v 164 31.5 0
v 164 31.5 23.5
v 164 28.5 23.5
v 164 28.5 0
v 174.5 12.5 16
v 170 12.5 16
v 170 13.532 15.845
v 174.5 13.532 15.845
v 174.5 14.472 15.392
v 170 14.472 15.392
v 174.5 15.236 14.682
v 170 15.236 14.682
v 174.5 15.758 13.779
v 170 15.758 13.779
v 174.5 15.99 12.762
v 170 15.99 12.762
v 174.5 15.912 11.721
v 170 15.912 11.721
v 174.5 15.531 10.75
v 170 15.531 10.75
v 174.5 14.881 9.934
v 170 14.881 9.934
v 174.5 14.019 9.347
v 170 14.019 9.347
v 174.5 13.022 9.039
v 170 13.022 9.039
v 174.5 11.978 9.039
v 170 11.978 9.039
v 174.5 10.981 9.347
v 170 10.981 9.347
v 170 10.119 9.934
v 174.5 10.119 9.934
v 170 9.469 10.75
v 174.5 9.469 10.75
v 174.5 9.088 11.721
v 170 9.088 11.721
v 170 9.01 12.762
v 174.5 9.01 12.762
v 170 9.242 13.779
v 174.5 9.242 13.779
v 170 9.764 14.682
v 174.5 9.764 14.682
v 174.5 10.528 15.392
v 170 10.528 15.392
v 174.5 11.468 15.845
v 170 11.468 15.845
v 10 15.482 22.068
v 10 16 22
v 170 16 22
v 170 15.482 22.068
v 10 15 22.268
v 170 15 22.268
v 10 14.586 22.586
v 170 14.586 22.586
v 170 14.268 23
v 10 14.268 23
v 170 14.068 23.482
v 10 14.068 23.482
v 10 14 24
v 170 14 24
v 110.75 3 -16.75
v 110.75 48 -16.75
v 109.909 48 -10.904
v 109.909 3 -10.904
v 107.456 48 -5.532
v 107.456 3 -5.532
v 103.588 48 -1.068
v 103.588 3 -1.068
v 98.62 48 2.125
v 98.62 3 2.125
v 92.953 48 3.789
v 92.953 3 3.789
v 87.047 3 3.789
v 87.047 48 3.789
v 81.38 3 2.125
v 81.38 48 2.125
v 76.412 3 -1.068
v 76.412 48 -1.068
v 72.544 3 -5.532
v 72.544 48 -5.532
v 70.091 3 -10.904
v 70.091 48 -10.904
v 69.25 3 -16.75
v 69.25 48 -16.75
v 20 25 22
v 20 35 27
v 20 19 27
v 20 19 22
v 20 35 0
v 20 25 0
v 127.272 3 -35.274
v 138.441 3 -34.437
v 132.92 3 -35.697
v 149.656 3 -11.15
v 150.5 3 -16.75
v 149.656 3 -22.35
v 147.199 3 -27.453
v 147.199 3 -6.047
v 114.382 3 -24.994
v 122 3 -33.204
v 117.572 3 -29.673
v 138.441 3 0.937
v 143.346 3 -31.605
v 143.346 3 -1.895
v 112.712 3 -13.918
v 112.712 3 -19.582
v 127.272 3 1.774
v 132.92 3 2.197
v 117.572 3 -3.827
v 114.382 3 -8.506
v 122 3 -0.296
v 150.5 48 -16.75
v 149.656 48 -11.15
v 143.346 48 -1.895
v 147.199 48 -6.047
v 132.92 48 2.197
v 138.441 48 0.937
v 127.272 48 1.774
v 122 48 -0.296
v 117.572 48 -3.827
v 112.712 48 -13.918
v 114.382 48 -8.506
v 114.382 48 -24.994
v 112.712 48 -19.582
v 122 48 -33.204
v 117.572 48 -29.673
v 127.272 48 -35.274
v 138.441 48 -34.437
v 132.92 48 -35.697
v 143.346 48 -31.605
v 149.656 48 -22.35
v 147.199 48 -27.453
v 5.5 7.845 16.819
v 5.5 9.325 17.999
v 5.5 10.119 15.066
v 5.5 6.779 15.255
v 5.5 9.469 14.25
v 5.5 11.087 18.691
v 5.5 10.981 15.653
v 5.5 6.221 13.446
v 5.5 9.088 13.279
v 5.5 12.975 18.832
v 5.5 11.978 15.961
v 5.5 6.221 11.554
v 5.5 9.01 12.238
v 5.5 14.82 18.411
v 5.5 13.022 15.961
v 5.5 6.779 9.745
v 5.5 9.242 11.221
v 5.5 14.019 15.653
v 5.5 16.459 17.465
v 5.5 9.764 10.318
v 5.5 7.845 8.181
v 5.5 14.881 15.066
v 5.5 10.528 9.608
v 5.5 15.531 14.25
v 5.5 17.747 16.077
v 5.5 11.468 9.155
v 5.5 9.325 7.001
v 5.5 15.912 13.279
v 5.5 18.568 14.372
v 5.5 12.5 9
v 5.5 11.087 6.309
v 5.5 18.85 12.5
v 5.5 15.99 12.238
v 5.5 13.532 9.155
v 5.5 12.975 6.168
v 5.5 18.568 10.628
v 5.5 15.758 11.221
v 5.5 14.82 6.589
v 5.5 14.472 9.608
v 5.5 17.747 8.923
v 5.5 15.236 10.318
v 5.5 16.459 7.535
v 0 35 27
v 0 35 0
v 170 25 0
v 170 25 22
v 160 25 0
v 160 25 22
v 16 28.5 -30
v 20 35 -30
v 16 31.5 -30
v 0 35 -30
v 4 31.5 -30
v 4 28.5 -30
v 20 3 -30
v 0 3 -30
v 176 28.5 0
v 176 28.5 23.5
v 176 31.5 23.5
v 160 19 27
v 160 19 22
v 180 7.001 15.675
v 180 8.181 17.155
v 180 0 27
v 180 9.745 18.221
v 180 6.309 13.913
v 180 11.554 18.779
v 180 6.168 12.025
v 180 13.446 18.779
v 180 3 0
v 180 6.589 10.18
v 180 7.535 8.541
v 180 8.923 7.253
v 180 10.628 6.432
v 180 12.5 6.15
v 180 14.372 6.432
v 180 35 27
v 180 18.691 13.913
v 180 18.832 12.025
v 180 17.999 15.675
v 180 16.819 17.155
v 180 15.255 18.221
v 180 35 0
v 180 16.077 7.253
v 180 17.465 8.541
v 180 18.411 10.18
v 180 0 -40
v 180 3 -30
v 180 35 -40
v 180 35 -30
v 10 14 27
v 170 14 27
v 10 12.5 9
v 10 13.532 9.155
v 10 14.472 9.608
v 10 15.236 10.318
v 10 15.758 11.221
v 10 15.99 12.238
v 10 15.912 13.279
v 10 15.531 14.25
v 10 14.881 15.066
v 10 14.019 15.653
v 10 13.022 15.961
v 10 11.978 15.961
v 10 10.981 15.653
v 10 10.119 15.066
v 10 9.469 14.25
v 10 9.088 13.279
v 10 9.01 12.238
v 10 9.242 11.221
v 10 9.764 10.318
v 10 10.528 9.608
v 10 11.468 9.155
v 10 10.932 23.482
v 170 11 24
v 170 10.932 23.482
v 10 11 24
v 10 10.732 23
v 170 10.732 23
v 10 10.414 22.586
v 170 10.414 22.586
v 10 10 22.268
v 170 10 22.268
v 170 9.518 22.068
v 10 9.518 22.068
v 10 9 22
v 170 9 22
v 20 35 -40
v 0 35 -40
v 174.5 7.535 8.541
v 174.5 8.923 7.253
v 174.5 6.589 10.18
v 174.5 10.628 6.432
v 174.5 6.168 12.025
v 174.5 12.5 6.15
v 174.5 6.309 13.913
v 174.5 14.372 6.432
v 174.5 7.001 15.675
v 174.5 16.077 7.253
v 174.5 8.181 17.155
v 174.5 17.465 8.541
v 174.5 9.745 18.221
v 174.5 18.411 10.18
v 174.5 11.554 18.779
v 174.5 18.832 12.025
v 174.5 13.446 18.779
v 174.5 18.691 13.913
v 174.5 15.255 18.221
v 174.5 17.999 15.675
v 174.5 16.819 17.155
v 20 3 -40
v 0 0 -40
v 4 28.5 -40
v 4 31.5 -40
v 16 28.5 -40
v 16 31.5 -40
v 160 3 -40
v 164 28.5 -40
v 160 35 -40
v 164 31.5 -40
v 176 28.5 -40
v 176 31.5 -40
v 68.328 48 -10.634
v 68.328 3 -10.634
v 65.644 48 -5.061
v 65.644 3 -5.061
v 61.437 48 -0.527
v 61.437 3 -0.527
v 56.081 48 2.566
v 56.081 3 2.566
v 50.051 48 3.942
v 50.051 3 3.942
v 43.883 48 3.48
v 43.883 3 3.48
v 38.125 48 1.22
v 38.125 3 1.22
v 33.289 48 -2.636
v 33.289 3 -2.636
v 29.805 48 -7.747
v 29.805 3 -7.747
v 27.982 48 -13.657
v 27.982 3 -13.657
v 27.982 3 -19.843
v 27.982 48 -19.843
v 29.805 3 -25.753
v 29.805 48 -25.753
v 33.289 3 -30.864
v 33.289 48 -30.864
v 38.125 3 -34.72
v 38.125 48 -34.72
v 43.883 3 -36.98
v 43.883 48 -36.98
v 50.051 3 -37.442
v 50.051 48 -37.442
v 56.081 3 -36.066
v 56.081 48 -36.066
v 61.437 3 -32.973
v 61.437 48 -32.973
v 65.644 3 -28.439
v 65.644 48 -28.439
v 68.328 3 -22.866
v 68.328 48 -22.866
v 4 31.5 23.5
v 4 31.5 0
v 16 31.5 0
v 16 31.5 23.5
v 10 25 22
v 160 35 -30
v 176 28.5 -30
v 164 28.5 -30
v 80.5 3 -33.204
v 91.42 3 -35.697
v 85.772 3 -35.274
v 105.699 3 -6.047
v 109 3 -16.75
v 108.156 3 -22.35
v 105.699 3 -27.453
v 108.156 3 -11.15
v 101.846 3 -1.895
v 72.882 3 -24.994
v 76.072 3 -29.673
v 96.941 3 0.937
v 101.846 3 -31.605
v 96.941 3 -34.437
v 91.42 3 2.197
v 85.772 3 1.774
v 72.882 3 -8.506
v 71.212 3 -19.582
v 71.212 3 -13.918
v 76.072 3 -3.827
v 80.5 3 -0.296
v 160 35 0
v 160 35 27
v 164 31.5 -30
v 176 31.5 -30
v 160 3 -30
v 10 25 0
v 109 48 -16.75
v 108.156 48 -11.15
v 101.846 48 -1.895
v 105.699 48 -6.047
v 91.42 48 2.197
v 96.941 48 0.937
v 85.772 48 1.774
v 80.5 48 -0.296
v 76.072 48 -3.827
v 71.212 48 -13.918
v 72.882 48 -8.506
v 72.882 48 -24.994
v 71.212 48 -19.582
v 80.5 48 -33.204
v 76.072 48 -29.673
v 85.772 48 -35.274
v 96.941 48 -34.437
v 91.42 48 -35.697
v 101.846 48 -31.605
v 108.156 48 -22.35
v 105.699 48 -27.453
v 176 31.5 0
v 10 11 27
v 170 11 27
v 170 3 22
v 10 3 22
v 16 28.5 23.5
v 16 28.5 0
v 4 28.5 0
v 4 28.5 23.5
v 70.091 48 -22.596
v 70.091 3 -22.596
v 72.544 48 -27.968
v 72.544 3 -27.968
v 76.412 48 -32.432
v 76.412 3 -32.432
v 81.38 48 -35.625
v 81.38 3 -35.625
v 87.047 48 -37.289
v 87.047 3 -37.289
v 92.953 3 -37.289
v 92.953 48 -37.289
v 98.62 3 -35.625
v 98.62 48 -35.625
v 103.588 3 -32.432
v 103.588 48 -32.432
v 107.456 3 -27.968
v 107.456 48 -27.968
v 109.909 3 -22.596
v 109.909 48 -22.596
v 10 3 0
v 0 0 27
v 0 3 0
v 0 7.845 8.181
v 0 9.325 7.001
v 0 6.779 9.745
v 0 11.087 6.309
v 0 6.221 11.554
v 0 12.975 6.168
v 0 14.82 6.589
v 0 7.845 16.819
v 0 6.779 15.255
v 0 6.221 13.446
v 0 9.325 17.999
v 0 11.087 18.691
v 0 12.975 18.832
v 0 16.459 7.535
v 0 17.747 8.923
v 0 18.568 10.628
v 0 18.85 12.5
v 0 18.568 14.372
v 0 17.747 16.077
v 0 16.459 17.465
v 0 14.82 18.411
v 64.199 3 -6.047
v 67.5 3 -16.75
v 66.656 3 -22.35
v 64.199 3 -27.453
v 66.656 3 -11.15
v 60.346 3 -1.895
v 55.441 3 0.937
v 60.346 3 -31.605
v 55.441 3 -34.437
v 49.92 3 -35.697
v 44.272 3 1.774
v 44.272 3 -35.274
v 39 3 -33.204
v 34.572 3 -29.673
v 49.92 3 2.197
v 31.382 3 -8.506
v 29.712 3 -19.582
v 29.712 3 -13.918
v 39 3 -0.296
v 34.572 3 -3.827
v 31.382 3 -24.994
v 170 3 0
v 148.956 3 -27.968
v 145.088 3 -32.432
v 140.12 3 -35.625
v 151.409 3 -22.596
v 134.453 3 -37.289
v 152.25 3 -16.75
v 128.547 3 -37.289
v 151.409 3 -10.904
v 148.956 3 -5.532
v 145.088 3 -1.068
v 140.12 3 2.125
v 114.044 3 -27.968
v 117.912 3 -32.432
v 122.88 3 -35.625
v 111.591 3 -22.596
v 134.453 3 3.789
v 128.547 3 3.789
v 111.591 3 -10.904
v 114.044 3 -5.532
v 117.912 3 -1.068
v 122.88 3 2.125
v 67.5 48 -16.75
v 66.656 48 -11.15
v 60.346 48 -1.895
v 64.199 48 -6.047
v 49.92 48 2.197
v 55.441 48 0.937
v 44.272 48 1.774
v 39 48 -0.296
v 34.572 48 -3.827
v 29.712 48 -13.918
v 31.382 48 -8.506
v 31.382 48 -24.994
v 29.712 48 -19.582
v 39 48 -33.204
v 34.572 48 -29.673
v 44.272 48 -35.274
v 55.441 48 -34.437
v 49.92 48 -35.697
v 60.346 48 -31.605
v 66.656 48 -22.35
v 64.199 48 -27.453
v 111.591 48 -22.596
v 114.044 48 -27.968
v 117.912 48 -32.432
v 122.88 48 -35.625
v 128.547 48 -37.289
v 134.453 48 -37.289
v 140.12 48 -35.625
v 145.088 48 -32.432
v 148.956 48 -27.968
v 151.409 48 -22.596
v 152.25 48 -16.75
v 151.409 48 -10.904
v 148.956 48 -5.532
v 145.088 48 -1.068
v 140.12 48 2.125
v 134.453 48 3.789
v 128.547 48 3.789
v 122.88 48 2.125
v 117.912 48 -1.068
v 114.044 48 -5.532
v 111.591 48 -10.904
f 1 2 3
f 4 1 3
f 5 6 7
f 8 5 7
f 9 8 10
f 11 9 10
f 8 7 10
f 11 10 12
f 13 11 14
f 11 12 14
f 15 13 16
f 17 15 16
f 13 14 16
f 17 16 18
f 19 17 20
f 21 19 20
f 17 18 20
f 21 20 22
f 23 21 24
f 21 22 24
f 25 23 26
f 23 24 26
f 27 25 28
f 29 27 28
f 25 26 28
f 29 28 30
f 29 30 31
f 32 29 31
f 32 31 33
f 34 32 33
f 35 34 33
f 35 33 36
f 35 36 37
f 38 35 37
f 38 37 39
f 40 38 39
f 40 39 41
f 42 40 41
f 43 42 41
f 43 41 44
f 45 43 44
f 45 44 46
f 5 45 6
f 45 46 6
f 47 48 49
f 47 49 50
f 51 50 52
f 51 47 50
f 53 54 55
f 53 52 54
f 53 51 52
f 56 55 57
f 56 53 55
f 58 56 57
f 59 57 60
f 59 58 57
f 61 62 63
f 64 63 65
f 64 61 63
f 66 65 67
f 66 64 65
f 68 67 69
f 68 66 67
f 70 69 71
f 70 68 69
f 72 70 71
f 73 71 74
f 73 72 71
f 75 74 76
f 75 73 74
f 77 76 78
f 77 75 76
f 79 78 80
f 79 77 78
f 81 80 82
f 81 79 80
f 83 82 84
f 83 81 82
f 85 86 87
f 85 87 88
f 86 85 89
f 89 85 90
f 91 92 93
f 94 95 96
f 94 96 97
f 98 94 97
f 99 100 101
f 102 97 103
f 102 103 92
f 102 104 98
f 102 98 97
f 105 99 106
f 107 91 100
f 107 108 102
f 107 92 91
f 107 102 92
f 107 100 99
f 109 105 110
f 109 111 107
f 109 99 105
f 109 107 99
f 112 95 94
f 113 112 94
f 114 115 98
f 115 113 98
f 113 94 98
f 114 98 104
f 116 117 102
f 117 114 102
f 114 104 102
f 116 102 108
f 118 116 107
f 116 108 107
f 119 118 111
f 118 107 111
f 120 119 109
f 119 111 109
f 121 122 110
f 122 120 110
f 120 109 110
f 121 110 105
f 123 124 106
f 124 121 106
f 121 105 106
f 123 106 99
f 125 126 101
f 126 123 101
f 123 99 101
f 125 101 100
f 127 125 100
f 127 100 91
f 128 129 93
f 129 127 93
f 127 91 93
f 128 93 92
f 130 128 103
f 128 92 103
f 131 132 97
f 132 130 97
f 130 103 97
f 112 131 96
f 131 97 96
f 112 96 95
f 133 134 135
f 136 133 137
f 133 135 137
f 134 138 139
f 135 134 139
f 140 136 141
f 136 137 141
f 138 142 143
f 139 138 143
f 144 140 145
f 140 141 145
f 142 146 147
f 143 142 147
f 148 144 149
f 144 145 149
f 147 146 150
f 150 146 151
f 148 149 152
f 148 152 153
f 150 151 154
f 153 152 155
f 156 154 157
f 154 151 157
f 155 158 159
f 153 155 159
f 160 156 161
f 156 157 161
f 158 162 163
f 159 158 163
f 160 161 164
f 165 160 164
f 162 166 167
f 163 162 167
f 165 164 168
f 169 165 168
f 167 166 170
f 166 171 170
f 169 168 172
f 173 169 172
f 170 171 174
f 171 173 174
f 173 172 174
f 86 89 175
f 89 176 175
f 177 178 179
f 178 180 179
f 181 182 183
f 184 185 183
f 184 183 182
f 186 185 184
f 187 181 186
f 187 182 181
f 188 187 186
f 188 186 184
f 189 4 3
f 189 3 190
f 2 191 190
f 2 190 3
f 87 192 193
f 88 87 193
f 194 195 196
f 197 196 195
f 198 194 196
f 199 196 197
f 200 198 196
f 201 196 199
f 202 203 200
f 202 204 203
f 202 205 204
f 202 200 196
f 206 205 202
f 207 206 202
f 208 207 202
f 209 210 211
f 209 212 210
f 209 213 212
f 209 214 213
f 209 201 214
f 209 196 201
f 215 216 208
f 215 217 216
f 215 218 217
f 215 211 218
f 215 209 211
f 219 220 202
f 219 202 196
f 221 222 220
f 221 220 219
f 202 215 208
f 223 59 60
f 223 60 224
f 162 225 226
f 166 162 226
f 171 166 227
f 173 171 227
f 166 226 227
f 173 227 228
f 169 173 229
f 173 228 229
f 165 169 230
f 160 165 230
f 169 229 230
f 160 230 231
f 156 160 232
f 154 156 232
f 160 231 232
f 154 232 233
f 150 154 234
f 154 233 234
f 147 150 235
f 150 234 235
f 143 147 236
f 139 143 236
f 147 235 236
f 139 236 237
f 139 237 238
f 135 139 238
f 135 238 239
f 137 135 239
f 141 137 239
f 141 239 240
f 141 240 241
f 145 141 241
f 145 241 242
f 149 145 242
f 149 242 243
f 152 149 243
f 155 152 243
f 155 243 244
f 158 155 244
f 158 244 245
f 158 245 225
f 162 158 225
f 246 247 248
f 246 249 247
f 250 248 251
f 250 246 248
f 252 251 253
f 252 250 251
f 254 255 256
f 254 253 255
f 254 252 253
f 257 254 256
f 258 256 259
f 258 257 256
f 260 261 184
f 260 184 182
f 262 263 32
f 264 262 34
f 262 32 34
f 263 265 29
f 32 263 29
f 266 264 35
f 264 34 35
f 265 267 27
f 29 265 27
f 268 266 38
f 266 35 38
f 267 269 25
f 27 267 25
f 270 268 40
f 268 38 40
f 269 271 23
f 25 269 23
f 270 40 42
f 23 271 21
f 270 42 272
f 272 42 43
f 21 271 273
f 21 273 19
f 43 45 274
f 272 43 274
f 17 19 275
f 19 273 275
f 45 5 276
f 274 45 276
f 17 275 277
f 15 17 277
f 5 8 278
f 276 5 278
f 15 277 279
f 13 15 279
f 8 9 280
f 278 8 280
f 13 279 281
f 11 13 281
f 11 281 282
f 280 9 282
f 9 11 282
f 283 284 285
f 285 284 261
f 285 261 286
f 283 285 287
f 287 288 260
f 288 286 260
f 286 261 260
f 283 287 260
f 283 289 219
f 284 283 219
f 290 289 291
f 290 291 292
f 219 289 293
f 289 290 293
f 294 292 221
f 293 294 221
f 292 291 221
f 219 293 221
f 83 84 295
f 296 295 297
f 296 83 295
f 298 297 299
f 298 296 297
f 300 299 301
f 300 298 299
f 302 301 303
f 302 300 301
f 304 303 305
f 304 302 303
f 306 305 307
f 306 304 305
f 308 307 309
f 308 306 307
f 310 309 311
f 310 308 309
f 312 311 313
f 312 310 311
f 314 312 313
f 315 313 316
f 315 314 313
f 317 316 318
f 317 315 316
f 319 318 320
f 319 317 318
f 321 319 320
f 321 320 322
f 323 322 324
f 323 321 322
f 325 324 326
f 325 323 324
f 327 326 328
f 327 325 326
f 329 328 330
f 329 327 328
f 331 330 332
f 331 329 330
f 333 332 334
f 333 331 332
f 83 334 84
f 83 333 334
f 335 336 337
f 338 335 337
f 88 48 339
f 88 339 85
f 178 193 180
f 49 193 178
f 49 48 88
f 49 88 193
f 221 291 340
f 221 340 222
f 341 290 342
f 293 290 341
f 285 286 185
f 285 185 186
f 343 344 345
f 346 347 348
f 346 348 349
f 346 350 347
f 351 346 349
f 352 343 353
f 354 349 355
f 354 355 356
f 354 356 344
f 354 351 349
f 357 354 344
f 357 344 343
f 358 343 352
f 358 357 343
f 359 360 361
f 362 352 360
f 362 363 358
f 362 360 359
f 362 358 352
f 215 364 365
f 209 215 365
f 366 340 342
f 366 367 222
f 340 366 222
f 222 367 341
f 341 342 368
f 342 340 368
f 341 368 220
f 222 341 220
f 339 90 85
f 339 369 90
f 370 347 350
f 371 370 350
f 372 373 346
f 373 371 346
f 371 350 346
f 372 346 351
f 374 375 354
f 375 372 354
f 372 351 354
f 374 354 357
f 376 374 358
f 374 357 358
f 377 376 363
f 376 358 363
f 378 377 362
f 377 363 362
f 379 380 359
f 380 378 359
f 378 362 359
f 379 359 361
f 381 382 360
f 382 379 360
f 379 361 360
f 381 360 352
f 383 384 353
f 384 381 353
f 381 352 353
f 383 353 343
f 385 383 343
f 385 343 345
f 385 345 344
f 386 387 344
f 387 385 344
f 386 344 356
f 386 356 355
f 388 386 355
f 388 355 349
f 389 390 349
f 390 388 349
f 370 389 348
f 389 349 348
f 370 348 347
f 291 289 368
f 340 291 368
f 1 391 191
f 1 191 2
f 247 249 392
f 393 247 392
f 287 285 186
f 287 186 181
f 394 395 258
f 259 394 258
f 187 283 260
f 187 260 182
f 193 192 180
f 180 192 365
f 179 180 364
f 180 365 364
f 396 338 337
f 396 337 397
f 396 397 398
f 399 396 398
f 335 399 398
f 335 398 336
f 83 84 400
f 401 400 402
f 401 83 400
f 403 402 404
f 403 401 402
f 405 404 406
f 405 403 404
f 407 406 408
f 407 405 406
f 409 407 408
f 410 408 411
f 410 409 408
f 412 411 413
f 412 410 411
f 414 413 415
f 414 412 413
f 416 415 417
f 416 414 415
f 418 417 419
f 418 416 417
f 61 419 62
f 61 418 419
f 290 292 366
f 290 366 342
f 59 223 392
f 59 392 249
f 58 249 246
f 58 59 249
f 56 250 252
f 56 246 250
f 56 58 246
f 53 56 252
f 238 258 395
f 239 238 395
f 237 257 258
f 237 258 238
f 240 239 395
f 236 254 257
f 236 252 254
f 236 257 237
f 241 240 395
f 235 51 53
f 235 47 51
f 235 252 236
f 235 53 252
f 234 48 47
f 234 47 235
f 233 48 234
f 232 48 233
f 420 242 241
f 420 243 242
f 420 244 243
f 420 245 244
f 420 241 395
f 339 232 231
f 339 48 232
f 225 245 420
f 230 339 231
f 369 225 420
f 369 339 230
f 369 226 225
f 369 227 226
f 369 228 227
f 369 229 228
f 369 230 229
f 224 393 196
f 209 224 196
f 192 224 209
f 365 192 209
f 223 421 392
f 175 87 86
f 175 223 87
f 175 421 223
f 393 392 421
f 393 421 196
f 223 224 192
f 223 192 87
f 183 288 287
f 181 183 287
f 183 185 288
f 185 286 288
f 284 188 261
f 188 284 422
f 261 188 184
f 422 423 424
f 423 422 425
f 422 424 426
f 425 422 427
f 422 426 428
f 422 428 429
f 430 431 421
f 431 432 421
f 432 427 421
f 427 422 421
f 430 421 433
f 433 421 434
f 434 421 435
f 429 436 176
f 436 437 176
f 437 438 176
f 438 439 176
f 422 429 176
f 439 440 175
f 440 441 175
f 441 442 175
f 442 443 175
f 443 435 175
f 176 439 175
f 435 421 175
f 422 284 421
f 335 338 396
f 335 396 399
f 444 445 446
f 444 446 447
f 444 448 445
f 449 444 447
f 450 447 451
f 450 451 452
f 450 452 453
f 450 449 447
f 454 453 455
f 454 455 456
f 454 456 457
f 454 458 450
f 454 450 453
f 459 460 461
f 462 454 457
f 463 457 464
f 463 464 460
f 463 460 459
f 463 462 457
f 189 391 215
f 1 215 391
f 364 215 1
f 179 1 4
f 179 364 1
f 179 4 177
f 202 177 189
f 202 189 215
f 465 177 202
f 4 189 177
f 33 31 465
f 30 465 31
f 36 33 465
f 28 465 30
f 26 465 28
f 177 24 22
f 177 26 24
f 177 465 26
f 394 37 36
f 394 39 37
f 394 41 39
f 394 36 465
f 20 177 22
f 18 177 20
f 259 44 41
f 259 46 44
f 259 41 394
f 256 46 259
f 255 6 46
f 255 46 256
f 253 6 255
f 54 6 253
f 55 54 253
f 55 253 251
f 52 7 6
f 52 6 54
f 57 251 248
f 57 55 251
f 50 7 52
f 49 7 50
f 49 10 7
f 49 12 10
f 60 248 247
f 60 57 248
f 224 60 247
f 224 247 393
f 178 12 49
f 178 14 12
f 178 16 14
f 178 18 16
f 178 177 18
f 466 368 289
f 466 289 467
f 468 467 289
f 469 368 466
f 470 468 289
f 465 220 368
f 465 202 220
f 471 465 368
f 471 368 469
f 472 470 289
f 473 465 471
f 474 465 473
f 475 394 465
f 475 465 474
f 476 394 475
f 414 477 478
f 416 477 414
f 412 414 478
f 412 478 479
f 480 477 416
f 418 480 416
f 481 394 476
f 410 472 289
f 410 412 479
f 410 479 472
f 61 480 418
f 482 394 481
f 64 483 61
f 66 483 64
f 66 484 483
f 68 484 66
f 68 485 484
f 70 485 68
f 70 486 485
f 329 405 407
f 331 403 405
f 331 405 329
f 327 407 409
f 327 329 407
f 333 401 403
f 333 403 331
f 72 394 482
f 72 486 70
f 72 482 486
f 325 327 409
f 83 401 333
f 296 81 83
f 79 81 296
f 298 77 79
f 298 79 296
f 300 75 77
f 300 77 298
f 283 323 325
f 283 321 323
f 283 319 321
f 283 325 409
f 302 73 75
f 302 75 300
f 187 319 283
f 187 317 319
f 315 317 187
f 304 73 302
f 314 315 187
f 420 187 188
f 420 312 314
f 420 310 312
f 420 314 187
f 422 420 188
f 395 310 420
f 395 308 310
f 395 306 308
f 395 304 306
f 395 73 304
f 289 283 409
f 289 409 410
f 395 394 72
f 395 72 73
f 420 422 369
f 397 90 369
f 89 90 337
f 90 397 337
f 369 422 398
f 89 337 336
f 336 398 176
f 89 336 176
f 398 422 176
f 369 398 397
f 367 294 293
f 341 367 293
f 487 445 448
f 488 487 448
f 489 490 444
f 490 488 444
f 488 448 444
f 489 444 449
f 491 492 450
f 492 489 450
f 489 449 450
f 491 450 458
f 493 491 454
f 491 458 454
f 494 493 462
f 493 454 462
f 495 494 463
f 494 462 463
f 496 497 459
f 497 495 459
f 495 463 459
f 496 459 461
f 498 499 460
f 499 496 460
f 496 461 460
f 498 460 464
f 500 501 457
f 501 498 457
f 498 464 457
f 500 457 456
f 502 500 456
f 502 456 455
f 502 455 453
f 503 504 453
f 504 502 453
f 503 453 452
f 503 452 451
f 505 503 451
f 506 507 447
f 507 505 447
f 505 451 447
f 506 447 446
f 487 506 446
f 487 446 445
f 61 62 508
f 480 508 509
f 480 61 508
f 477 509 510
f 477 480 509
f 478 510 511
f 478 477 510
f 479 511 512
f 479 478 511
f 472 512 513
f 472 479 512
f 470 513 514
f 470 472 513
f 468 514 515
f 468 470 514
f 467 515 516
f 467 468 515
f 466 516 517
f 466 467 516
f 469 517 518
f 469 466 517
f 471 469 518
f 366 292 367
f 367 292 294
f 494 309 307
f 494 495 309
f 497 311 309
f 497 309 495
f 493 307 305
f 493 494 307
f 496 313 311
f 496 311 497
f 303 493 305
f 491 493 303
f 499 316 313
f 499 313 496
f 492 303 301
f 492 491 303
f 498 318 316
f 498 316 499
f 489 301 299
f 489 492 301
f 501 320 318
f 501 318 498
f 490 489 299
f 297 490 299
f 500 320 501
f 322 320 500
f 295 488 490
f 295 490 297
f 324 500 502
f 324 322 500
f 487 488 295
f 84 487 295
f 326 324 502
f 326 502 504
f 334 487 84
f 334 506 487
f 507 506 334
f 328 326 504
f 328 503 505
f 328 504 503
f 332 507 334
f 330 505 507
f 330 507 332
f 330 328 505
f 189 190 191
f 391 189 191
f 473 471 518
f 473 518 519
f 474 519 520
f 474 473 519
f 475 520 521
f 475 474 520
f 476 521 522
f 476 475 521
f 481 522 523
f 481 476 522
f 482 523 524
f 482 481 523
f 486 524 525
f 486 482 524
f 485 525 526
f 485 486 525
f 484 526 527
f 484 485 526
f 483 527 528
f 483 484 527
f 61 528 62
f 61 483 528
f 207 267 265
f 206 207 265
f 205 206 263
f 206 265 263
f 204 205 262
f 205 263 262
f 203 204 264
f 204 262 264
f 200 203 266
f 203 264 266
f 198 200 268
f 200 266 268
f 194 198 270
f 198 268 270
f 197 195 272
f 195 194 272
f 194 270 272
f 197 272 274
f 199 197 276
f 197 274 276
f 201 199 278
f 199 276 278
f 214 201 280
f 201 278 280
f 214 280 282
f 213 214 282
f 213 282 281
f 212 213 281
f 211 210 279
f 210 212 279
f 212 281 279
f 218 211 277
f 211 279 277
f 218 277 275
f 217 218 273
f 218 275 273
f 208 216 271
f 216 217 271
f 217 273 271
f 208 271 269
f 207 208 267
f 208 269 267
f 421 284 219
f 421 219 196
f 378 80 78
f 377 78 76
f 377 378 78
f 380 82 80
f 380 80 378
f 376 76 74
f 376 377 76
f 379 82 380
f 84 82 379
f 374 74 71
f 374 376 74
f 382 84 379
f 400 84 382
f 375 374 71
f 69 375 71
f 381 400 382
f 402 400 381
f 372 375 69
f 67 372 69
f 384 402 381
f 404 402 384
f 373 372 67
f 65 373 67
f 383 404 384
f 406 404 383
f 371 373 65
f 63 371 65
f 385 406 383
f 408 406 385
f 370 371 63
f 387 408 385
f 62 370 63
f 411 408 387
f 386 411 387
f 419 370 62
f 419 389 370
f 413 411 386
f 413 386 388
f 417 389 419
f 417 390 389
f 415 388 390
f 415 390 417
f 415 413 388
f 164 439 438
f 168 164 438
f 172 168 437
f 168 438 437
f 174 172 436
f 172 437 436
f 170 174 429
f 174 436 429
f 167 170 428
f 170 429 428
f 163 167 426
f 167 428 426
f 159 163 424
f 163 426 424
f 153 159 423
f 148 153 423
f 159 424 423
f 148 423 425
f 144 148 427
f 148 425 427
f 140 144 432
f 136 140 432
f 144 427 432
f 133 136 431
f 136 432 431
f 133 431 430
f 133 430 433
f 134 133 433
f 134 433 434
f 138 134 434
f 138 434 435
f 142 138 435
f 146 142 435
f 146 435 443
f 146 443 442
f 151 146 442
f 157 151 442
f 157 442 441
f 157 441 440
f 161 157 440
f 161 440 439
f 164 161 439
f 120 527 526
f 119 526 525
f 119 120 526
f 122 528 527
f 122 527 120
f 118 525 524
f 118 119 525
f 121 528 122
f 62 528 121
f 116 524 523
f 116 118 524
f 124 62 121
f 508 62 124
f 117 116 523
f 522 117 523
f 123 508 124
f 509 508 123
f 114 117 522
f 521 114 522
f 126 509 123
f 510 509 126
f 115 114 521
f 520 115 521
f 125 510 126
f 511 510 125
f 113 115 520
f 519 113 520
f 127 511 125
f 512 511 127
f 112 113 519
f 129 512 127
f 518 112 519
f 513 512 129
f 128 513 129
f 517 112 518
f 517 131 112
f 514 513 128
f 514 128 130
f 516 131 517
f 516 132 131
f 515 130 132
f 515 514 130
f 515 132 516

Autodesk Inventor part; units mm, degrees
ref_plane "YZ Plane" through (0, 0, 0) normal (1, 0, 0) x (0, 1, 0)
ref_plane "XZ Plane" through (0, 0, 0) normal (0, 1, 0) x (-1, 0, 0)
ref_plane "XY Plane" through (0, 0, 0) normal (0, 0, 1) x (1, 0, 0)
sketch "Sketch1" plane through (0, 0, 0) normal (1, 0, 0) x (0, 1, 0)
  line L0 (0, 0) -> (35, 0)
  line L1 (35, 0) -> (35, 27)
  line L2 (35, 27) -> (0, 27)
  line L3 (0, 27) -> (0, 0)
  line L4 (0, 27) -> (25, 27) construction
  line L5 (25, 27) -> (25, 0) construction
  line L6 (25, 0) -> (0, 0) construction
  line L7 (0, 0) -> (0, 27) construction
  circle A0 centre (12.5, 12.5) radius 6.35
  dimension "d0" = 35
  dimension "d1" = 27
  dimension "d2" = 25
  dimension "d3" = 12.7
extrude "Extrusion1" add sketch "Sketch1" along normal blind 10
sketch "Sketch2" plane through (10, 0, 0) normal (1, 0, 0) x (0, 0, -1)
  line L0 (0, 35) -> (-27, 35) projected
  line L1 (0, 0) -> (0, 35) projected
  line L2 (-27, 35) -> (0, 35)
  line L3 (0, 35) -> (0, 25)
  line L4 (0, 25) -> (-27, 25)
  line L5 (-27, 25) -> (-27, 35)
  dimension "d6" = 10
extrude "Extrusion2" add sketch "Sketch2" along normal blind 10
sketch "Sketch3" plane through (10, 0, 0) normal (1, 0, 0) x (0, 0, -1)
  point P0 (0, 0)
sketch "Sketch4" plane through (0, 0, 0) normal (0, 0, -1) x (-1, 0, 0)
  point P0 (0, 0)
sketch "Sketch5" plane through (10, 0, 0) normal (1, 0, 0) x (0, 0, -1)
  point P0 (0, 0)
sketch "Sketch6" plane through (10, 0, 0) normal (1, 0, 0) x (0, 0, -1)
  line L0 (-27, 25) -> (-27, 0) projected
  line L1 (-27, 0) -> (-22, 0)
  line L2 (-22, 0) -> (-22, 11)
  line L3 (-22, 11) -> (-27, 11)
  line L4 (-27, 11) -> (-27, 0)
  line L5 (-22, 14) -> (-27, 14)
  line L6 (-27, 14) -> (-27, 19)
  line L7 (-27, 19) -> (-22, 19)
  line L8 (-22, 19) -> (-22, 14)
  point P0 (0, 0)
  dimension "d9" = 5
  dimension "d10" = 11
  dimension "d11" = 5
extrude "Extrusion3" add sketch "Sketch6" along normal blind 150
sketch "Sketch7" plane through (10, 19, 27) normal (0, 1, 0) x (1, 0, 0)
  line L0 (-10, 0) -> (10, 0) projected
  line L1 (0, 5) -> (150, 5) projected
  line L2 (0, 0) -> (10, 0)
  line L3 (10, 0) -> (10, 5)
  line L4 (10, 5) -> (0, 5)
  line L5 (0, 5) -> (0, 0)
  point P0 (-10, 27)
  dimension "d14" = 10
extrude "Extrusion4" add sketch "Sketch7" along normal blind 7.5
sketch "Sketch8" plane through (160, 0, 0) normal (1, 0, 0) x (0, 0, -1)
  line L0 (-27, 14) -> (-22, 14) projected
  line L1 (-27, 14) -> (-22, 14)
  line L2 (-22, 25) -> (-22, 14) projected
  line L3 (-22, 14) -> (-22, 25)
  line L4 (-22, 25) -> (0, 25) projected
  line L5 (-22, 25) -> (0, 25)
  line L6 (0, 25) -> (0, 35) projected
  line L7 (0, 25) -> (0, 35)
  line L8 (0, 35) -> (-27, 35)
  line L9 (-27, 35) -> (-27, 14)
  line L10 (-22, 11) -> (-22, 0) projected
  line L11 (-27, 0) -> (-22, 0)
  line L12 (-22, 0) -> (-22, 11)
  line L13 (-22, 11) -> (-27, 11)
  line L14 (-27, 11) -> (-27, 0)
  point P0 (0, 0)
extrude "Extrusion5" add sketch "Sketch8" along normal blind 10
sketch "Sketch9" plane through (170, 0, 0) normal (1, 0, 0) x (0, 0, -1)
  line L0 (0, 35) -> (-27, 35) projected
  line L1 (-27, 35) -> (0, 35)
  line L2 (0, 35) -> (0, 0)
  line L3 (0, 0) -> (-27, 0)
  line L4 (-27, 0) -> (-27, 35)
  circle A0 centre (-12.5, 12.5) radius 6.35 projected
  circle A1 centre (-12.5, 12.5) radius 6.35
extrude "Extrusion6" add sketch "Sketch9" along normal blind 10
fillet "Fillet1" radius 2 2 edges at (90, 11, 22) (90, 14, 22)
sketch "Sketch10" plane through (20, 0, 0) normal (1, 0, 0) x (0, 0, -1)
  line L0 (0, 35) -> (-27, 35) projected
  line L1 (-13.5, 35) -> (-20.5, 35)
  line L2 (-20.5, 35) -> (-6.5, 35)
  line L3 (-20.5, 35) -> (-6.5, 35)
  line L4 (-6.5, 35) -> (-6.5, 32)
  line L5 (-6.5, 32) -> (-20.5, 32)
  line L6 (-20.5, 32) -> (-20.5, 35)
  point P0 (0, 0)
  dimension "d22" = 7
  dimension "d23" = 14
  dimension "d24" = 3
extrude "Extrusion7" add sketch "Sketch10" along normal blind 140
sketch "Sketch11" plane through (0, 35, 27) normal (0, 1, 0) x (1, 0, 0)
  point P0 (0, 27)
sketch "Sketch12" plane through (160, 25, 0) normal (0, 0, -1) x (-1, 0, 0)
  line L0 (-4, 3.5) -> (-16, 3.5)
  line L1 (-16, 3.5) -> (-16, 6.5)
  line L2 (-16, 6.5) -> (-4, 6.5)
  line L3 (-4, 6.5) -> (-4, 3.5)
  line L4 (-4, 3.5) -> (-16, 6.5) construction
  line L5 (-16, 3.5) -> (-4, 6.5) construction
  line L6 (156, 6.5) -> (144, 6.5)
  line L7 (144, 6.5) -> (144, 3.5)
  line L8 (144, 3.5) -> (156, 3.5)
  line L9 (156, 3.5) -> (156, 6.5)
  line L10 (156, 6.5) -> (144, 3.5) construction
  line L11 (144, 6.5) -> (156, 3.5) construction
  point P0 (160, -25)
  point P1 (-10, 5)
  point P2 (150, 5)
  dimension "d27" = 12
  dimension "d28" = 3
  dimension "d29" = 12
  dimension "d30" = 3
extrude "Extrusion8" cut sketch "Sketch12" against normal blind 23.5
sketch "Sketch13" plane through (0, 0, 0) normal (-1, 0, 0) x (0, 0, 1)
  circle A0 centre (12.5, 12.5) radius 6.35 construction
  circle A1 centre (12.5, 12.5) radius 20.6375 construction
  point P0 (0, 0)
  dimension "d33" = 41.275
sketch "Sketch14" plane through (170, 0, 0) normal (-1, 0, 0) x (0, 0, 1)
  circle A0 centre (12.5, 12.5) radius 6.35 projected
  circle A1 centre (12.5, 12.5) radius 6.35
  circle A2 centre (12.5, 12.5) radius 3.5
  point P0 (0, 0)
  dimension "d34" = 7
extrude "Extrusion9" add sketch "Sketch14" against normal blind 4.5
sketch "Sketch15" plane through (10, 0, 0) normal (1, 0, 0) x (0, 0, -1)
  circle A0 centre (-12.5, 12.5) radius 3.5 projected
  circle A1 centre (-12.5, 12.5) radius 6.35
  circle A2 centre (-12.5, 12.5) radius 3.5
  point P0 (0, 0)
  dimension "d37" = 7
extrude "Extrusion10" add sketch "Sketch15" against normal blind 4.5
sketch "Sketch16" plane through (0, 0, 27) normal (0, 0, 1) x (1, 0, 0)
  point P0 (0, 0)
sketch "Sketch17" plane through (0, 0, 27) normal (0, 0, 1) x (1, 0, 0)
  point P0 (0, 0)
sketch "Sketch18" plane through (0, 0, 27) normal (0, 0, 1) x (1, 0, 0)
  line L0 (0, 35) -> (0, 0) projected
  line L1 (180, 35) -> (180, 0) projected
  line L2 (0, 0) -> (180, 0)
  line L3 (180, 0) -> (180, 3)
  line L4 (180, 3) -> (0, 3)
  line L5 (0, 3) -> (0, 0)
  point P0 (0, 3)
  dimension "d40" = 3
extrude "Extrusion11" add sketch "Sketch18" against normal blind 67
sketch "Sketch19" plane through (0, 3, 27) normal (0, 1, 0) x (-1, 0, 0)
  line L0 (180, 0) -> (180, -42) construction
  point P0 (0, 0)
sketch "Sketch20" plane through (0, 3, -40) normal (0, 1, 0) x (1, 0, 0)
  circle A0 centre (90, -20) radius 19
  circle A1 centre (90, -20) radius 20
  circle A2 centre (50, -20) radius 20
  circle A3 centre (50, -20) radius 19
  circle A4 centre (130, -20) radius 20
  circle A5 centre (130, -20) radius 19
  point P0 (0, -40)
  point P1 (110, -20)
  point P2 (70, -20)
  dimension "d43" = 38
  dimension "d44" = 38
  dimension "d45" = 38
extrude "Extrusion12" add sketch "Sketch20" along normal blind 30
sketch "Sketch21" plane through (10, 3, 22) normal (0, 1, 0) x (1, 0, 0)
  line L0 (-10, 22) -> (-10, 62) projected
  line L1 (-10, 62) -> (10, 62)
  line L2 (10, 62) -> (10, 52)
  line L3 (10, 52) -> (-10, 52)
  line L4 (-10, 52) -> (-10, 62)
  line L5 (170, 62) -> (-10, 62) projected
  line L6 (170, 62) -> (150, 62)
  line L7 (150, 62) -> (150, 52)
  line L8 (150, 52) -> (170, 52)
  line L9 (170, 52) -> (170, 62)
  dimension "d48" = 10
  dimension "d49" = 10
extrude "Extrusion13" add sketch "Sketch21" along normal blind 32
sketch "Sketch22" plane through (4, 28.5, 0) normal (0, 1, 0) x (1, 0, 0)
  point P0 (-4, 0)
sketch "Sketch23" plane through (0, 0, -40) normal (0, 0, -1) x (-1, 0, 0)
  line L0 (-4, 28.5) -> (-16, 28.5) projected
  line L1 (-4, 31.5) -> (-4, 28.5) projected
  line L2 (-16, 28.5) -> (-4, 28.5)
  line L3 (-4, 28.5) -> (-4, 31.5)
  line L4 (-4, 31.5) -> (-16, 31.5)
  line L5 (-16, 31.5) -> (-16, 28.5)
  line L6 (-164, 28.5) -> (-176, 28.5) projected
  line L7 (-164, 31.5) -> (-164, 28.5) projected
  line L8 (-176, 28.5) -> (-164, 28.5)
  line L9 (-164, 28.5) -> (-164, 31.5)
  line L10 (-164, 31.5) -> (-176, 31.5)
  line L11 (-176, 31.5) -> (-176, 28.5)
  point P0 (0, 0)
extrude "Extrusion14" cut sketch "Sketch23" against normal blind 10
sketch "Sketch24" plane through (130, 33, -20) normal (0, 1, 0) x (1, 0, 0)
  line L0 (27.2959, -23.1323) -> (-103.8128, -23.1323)
  line L1 (-103.8128, -23.1323) -> (-103.8128, 25.7271)
  line L2 (-103.8128, 25.7271) -> (27.2959, 25.7271)
  line L3 (27.2959, 25.7271) -> (27.2959, -23.1323)
  point P0 (-130, -20)
extrude "Extrusion15" cut sketch "Sketch24" against normal blind 30
sketch "Sketch25" plane through (10, 3, 22) normal (0, 1, 0) x (1, 0, 0)
  circle A0 centre (80, 38.75) radius 19
  circle A1 centre (80, 38.75) radius 20.75
  circle A2 centre (121.5, 38.75) radius 20.75
  circle A3 centre (121.5, 38.75) radius 19
  circle A4 centre (38.5, 38.75) radius 20.75
  circle A5 centre (38.5, 38.75) radius 19
  point P0 (-10, 22)
  point P1 (59.25, 38.75)
  point P2 (100.75, 38.75)
  dimension "d56" = 38
  dimension "d57" = 41.5
  dimension "d58" = 38
  dimension "d59" = 38
extrude "Extrusion16" add sketch "Sketch25" along normal blind 45
sketch "Sketch26" plane through (0, 35, 27) normal (0, 1, 0) x (1, 0, 0)
  line L0 (20, 6.5) -> (160, 6.5) projected
  line L1 (20, 20.5) -> (160, 20.5) projected
  line L2 (20, 6.5) -> (160, 6.5)
  line L3 (160, 6.5) -> (160, 20.5)
  line L4 (160, 20.5) -> (20, 20.5)
  line L5 (20, 20.5) -> (20, 6.5)
  point P0 (0, 27)
extrude "Extrusion17" cut sketch "Sketch26" against normal blind 5
properties part number "_3DPrint"
